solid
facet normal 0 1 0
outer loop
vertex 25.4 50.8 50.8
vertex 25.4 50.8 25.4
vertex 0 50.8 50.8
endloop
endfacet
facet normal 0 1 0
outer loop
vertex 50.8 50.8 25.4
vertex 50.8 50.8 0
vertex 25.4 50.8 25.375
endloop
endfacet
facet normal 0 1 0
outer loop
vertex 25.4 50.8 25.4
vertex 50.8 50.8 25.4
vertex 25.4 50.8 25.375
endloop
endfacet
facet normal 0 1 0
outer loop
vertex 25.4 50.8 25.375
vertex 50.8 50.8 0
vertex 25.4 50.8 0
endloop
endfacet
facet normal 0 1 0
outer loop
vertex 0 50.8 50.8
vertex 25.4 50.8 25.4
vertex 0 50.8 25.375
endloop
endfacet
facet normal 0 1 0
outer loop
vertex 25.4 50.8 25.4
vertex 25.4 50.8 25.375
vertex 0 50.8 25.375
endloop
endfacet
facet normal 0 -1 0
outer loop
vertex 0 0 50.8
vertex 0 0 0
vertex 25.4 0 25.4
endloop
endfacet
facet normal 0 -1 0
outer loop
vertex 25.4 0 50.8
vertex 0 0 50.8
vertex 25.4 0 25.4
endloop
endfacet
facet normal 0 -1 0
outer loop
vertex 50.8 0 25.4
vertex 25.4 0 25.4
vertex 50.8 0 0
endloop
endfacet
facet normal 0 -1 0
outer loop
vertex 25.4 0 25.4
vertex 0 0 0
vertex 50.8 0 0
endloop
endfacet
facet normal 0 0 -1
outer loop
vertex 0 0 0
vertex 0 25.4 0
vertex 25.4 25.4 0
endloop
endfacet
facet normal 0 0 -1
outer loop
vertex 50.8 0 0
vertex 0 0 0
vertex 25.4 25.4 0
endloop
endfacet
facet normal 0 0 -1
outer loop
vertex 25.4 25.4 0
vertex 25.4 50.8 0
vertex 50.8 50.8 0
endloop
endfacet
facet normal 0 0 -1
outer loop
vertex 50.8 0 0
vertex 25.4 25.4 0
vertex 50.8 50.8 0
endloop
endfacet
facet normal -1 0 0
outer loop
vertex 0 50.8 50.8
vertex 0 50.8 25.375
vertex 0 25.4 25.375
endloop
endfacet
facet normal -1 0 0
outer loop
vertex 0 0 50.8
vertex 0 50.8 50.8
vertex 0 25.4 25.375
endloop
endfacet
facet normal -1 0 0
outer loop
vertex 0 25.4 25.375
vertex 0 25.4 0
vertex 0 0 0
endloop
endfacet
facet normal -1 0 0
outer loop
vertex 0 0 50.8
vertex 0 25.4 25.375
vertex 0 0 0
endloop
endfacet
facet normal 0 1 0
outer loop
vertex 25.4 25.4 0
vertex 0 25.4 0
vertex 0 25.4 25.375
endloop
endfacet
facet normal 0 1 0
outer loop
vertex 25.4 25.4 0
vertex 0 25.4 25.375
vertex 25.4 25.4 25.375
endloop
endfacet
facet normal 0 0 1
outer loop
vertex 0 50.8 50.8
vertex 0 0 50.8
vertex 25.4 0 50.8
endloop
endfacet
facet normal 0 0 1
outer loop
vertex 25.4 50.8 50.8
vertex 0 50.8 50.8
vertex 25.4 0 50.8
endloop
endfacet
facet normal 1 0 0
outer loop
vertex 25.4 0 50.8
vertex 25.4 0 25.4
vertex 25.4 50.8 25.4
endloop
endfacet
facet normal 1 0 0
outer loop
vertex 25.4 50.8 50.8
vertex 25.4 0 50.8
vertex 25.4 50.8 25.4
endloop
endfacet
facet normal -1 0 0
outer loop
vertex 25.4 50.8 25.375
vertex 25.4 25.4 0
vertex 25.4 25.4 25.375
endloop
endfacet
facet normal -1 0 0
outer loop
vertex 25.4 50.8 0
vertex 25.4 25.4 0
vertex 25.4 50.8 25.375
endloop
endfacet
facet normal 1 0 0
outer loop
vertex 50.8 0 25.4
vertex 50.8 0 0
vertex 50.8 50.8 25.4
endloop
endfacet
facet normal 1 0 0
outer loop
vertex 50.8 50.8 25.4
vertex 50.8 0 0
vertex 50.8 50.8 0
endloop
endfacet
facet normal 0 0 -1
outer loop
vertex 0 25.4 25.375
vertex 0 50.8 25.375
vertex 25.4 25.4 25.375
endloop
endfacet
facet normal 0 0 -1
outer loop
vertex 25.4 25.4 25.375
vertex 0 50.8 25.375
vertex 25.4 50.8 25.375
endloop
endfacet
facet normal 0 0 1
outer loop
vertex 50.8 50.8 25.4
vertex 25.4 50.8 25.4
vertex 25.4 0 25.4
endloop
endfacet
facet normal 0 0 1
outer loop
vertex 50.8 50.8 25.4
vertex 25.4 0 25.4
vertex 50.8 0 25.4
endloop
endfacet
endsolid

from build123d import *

# Parameters (mm, degrees)
F0_W     = 25.4
F0_H     = 25.4
F1_DEPTH = 25.4
F2_DEPTH = 50.8
F3_DEPTH = 25.3746


with BuildPart() as f1:
    # F0 (on Top) → F1 (new body)
    with BuildSketch(Plane.XY):
        with Locations((12.7, 12.7)):
            Rectangle(F0_W, F0_H)
        Polygon((25.4, 25.4), (25.4, 0), (50.8, 0), (50.8, 50.8), (25.4, 50.8), align=None)
        with Locations((12.7, 38.1)):
            Rectangle(F0_W, F0_H)
    extrude(amount=F1_DEPTH)

    # F0 (on Top) → F2 (join)
    with BuildSketch(Plane.XY):
        with Locations((12.7, 38.1)):
            Rectangle(F0_W, F0_H)
        with Locations((12.7, 12.7)):
            Rectangle(F0_W, F0_H)
    extrude(amount=F2_DEPTH)

    # F0 (on Top) → F3 (cut)
    with BuildSketch(Plane.XY):
        with Locations((12.7, 38.1)):
            Rectangle(F0_W, F0_H)
    extrude(amount=F3_DEPTH, mode=Mode.SUBTRACT)


solid = f1.part
